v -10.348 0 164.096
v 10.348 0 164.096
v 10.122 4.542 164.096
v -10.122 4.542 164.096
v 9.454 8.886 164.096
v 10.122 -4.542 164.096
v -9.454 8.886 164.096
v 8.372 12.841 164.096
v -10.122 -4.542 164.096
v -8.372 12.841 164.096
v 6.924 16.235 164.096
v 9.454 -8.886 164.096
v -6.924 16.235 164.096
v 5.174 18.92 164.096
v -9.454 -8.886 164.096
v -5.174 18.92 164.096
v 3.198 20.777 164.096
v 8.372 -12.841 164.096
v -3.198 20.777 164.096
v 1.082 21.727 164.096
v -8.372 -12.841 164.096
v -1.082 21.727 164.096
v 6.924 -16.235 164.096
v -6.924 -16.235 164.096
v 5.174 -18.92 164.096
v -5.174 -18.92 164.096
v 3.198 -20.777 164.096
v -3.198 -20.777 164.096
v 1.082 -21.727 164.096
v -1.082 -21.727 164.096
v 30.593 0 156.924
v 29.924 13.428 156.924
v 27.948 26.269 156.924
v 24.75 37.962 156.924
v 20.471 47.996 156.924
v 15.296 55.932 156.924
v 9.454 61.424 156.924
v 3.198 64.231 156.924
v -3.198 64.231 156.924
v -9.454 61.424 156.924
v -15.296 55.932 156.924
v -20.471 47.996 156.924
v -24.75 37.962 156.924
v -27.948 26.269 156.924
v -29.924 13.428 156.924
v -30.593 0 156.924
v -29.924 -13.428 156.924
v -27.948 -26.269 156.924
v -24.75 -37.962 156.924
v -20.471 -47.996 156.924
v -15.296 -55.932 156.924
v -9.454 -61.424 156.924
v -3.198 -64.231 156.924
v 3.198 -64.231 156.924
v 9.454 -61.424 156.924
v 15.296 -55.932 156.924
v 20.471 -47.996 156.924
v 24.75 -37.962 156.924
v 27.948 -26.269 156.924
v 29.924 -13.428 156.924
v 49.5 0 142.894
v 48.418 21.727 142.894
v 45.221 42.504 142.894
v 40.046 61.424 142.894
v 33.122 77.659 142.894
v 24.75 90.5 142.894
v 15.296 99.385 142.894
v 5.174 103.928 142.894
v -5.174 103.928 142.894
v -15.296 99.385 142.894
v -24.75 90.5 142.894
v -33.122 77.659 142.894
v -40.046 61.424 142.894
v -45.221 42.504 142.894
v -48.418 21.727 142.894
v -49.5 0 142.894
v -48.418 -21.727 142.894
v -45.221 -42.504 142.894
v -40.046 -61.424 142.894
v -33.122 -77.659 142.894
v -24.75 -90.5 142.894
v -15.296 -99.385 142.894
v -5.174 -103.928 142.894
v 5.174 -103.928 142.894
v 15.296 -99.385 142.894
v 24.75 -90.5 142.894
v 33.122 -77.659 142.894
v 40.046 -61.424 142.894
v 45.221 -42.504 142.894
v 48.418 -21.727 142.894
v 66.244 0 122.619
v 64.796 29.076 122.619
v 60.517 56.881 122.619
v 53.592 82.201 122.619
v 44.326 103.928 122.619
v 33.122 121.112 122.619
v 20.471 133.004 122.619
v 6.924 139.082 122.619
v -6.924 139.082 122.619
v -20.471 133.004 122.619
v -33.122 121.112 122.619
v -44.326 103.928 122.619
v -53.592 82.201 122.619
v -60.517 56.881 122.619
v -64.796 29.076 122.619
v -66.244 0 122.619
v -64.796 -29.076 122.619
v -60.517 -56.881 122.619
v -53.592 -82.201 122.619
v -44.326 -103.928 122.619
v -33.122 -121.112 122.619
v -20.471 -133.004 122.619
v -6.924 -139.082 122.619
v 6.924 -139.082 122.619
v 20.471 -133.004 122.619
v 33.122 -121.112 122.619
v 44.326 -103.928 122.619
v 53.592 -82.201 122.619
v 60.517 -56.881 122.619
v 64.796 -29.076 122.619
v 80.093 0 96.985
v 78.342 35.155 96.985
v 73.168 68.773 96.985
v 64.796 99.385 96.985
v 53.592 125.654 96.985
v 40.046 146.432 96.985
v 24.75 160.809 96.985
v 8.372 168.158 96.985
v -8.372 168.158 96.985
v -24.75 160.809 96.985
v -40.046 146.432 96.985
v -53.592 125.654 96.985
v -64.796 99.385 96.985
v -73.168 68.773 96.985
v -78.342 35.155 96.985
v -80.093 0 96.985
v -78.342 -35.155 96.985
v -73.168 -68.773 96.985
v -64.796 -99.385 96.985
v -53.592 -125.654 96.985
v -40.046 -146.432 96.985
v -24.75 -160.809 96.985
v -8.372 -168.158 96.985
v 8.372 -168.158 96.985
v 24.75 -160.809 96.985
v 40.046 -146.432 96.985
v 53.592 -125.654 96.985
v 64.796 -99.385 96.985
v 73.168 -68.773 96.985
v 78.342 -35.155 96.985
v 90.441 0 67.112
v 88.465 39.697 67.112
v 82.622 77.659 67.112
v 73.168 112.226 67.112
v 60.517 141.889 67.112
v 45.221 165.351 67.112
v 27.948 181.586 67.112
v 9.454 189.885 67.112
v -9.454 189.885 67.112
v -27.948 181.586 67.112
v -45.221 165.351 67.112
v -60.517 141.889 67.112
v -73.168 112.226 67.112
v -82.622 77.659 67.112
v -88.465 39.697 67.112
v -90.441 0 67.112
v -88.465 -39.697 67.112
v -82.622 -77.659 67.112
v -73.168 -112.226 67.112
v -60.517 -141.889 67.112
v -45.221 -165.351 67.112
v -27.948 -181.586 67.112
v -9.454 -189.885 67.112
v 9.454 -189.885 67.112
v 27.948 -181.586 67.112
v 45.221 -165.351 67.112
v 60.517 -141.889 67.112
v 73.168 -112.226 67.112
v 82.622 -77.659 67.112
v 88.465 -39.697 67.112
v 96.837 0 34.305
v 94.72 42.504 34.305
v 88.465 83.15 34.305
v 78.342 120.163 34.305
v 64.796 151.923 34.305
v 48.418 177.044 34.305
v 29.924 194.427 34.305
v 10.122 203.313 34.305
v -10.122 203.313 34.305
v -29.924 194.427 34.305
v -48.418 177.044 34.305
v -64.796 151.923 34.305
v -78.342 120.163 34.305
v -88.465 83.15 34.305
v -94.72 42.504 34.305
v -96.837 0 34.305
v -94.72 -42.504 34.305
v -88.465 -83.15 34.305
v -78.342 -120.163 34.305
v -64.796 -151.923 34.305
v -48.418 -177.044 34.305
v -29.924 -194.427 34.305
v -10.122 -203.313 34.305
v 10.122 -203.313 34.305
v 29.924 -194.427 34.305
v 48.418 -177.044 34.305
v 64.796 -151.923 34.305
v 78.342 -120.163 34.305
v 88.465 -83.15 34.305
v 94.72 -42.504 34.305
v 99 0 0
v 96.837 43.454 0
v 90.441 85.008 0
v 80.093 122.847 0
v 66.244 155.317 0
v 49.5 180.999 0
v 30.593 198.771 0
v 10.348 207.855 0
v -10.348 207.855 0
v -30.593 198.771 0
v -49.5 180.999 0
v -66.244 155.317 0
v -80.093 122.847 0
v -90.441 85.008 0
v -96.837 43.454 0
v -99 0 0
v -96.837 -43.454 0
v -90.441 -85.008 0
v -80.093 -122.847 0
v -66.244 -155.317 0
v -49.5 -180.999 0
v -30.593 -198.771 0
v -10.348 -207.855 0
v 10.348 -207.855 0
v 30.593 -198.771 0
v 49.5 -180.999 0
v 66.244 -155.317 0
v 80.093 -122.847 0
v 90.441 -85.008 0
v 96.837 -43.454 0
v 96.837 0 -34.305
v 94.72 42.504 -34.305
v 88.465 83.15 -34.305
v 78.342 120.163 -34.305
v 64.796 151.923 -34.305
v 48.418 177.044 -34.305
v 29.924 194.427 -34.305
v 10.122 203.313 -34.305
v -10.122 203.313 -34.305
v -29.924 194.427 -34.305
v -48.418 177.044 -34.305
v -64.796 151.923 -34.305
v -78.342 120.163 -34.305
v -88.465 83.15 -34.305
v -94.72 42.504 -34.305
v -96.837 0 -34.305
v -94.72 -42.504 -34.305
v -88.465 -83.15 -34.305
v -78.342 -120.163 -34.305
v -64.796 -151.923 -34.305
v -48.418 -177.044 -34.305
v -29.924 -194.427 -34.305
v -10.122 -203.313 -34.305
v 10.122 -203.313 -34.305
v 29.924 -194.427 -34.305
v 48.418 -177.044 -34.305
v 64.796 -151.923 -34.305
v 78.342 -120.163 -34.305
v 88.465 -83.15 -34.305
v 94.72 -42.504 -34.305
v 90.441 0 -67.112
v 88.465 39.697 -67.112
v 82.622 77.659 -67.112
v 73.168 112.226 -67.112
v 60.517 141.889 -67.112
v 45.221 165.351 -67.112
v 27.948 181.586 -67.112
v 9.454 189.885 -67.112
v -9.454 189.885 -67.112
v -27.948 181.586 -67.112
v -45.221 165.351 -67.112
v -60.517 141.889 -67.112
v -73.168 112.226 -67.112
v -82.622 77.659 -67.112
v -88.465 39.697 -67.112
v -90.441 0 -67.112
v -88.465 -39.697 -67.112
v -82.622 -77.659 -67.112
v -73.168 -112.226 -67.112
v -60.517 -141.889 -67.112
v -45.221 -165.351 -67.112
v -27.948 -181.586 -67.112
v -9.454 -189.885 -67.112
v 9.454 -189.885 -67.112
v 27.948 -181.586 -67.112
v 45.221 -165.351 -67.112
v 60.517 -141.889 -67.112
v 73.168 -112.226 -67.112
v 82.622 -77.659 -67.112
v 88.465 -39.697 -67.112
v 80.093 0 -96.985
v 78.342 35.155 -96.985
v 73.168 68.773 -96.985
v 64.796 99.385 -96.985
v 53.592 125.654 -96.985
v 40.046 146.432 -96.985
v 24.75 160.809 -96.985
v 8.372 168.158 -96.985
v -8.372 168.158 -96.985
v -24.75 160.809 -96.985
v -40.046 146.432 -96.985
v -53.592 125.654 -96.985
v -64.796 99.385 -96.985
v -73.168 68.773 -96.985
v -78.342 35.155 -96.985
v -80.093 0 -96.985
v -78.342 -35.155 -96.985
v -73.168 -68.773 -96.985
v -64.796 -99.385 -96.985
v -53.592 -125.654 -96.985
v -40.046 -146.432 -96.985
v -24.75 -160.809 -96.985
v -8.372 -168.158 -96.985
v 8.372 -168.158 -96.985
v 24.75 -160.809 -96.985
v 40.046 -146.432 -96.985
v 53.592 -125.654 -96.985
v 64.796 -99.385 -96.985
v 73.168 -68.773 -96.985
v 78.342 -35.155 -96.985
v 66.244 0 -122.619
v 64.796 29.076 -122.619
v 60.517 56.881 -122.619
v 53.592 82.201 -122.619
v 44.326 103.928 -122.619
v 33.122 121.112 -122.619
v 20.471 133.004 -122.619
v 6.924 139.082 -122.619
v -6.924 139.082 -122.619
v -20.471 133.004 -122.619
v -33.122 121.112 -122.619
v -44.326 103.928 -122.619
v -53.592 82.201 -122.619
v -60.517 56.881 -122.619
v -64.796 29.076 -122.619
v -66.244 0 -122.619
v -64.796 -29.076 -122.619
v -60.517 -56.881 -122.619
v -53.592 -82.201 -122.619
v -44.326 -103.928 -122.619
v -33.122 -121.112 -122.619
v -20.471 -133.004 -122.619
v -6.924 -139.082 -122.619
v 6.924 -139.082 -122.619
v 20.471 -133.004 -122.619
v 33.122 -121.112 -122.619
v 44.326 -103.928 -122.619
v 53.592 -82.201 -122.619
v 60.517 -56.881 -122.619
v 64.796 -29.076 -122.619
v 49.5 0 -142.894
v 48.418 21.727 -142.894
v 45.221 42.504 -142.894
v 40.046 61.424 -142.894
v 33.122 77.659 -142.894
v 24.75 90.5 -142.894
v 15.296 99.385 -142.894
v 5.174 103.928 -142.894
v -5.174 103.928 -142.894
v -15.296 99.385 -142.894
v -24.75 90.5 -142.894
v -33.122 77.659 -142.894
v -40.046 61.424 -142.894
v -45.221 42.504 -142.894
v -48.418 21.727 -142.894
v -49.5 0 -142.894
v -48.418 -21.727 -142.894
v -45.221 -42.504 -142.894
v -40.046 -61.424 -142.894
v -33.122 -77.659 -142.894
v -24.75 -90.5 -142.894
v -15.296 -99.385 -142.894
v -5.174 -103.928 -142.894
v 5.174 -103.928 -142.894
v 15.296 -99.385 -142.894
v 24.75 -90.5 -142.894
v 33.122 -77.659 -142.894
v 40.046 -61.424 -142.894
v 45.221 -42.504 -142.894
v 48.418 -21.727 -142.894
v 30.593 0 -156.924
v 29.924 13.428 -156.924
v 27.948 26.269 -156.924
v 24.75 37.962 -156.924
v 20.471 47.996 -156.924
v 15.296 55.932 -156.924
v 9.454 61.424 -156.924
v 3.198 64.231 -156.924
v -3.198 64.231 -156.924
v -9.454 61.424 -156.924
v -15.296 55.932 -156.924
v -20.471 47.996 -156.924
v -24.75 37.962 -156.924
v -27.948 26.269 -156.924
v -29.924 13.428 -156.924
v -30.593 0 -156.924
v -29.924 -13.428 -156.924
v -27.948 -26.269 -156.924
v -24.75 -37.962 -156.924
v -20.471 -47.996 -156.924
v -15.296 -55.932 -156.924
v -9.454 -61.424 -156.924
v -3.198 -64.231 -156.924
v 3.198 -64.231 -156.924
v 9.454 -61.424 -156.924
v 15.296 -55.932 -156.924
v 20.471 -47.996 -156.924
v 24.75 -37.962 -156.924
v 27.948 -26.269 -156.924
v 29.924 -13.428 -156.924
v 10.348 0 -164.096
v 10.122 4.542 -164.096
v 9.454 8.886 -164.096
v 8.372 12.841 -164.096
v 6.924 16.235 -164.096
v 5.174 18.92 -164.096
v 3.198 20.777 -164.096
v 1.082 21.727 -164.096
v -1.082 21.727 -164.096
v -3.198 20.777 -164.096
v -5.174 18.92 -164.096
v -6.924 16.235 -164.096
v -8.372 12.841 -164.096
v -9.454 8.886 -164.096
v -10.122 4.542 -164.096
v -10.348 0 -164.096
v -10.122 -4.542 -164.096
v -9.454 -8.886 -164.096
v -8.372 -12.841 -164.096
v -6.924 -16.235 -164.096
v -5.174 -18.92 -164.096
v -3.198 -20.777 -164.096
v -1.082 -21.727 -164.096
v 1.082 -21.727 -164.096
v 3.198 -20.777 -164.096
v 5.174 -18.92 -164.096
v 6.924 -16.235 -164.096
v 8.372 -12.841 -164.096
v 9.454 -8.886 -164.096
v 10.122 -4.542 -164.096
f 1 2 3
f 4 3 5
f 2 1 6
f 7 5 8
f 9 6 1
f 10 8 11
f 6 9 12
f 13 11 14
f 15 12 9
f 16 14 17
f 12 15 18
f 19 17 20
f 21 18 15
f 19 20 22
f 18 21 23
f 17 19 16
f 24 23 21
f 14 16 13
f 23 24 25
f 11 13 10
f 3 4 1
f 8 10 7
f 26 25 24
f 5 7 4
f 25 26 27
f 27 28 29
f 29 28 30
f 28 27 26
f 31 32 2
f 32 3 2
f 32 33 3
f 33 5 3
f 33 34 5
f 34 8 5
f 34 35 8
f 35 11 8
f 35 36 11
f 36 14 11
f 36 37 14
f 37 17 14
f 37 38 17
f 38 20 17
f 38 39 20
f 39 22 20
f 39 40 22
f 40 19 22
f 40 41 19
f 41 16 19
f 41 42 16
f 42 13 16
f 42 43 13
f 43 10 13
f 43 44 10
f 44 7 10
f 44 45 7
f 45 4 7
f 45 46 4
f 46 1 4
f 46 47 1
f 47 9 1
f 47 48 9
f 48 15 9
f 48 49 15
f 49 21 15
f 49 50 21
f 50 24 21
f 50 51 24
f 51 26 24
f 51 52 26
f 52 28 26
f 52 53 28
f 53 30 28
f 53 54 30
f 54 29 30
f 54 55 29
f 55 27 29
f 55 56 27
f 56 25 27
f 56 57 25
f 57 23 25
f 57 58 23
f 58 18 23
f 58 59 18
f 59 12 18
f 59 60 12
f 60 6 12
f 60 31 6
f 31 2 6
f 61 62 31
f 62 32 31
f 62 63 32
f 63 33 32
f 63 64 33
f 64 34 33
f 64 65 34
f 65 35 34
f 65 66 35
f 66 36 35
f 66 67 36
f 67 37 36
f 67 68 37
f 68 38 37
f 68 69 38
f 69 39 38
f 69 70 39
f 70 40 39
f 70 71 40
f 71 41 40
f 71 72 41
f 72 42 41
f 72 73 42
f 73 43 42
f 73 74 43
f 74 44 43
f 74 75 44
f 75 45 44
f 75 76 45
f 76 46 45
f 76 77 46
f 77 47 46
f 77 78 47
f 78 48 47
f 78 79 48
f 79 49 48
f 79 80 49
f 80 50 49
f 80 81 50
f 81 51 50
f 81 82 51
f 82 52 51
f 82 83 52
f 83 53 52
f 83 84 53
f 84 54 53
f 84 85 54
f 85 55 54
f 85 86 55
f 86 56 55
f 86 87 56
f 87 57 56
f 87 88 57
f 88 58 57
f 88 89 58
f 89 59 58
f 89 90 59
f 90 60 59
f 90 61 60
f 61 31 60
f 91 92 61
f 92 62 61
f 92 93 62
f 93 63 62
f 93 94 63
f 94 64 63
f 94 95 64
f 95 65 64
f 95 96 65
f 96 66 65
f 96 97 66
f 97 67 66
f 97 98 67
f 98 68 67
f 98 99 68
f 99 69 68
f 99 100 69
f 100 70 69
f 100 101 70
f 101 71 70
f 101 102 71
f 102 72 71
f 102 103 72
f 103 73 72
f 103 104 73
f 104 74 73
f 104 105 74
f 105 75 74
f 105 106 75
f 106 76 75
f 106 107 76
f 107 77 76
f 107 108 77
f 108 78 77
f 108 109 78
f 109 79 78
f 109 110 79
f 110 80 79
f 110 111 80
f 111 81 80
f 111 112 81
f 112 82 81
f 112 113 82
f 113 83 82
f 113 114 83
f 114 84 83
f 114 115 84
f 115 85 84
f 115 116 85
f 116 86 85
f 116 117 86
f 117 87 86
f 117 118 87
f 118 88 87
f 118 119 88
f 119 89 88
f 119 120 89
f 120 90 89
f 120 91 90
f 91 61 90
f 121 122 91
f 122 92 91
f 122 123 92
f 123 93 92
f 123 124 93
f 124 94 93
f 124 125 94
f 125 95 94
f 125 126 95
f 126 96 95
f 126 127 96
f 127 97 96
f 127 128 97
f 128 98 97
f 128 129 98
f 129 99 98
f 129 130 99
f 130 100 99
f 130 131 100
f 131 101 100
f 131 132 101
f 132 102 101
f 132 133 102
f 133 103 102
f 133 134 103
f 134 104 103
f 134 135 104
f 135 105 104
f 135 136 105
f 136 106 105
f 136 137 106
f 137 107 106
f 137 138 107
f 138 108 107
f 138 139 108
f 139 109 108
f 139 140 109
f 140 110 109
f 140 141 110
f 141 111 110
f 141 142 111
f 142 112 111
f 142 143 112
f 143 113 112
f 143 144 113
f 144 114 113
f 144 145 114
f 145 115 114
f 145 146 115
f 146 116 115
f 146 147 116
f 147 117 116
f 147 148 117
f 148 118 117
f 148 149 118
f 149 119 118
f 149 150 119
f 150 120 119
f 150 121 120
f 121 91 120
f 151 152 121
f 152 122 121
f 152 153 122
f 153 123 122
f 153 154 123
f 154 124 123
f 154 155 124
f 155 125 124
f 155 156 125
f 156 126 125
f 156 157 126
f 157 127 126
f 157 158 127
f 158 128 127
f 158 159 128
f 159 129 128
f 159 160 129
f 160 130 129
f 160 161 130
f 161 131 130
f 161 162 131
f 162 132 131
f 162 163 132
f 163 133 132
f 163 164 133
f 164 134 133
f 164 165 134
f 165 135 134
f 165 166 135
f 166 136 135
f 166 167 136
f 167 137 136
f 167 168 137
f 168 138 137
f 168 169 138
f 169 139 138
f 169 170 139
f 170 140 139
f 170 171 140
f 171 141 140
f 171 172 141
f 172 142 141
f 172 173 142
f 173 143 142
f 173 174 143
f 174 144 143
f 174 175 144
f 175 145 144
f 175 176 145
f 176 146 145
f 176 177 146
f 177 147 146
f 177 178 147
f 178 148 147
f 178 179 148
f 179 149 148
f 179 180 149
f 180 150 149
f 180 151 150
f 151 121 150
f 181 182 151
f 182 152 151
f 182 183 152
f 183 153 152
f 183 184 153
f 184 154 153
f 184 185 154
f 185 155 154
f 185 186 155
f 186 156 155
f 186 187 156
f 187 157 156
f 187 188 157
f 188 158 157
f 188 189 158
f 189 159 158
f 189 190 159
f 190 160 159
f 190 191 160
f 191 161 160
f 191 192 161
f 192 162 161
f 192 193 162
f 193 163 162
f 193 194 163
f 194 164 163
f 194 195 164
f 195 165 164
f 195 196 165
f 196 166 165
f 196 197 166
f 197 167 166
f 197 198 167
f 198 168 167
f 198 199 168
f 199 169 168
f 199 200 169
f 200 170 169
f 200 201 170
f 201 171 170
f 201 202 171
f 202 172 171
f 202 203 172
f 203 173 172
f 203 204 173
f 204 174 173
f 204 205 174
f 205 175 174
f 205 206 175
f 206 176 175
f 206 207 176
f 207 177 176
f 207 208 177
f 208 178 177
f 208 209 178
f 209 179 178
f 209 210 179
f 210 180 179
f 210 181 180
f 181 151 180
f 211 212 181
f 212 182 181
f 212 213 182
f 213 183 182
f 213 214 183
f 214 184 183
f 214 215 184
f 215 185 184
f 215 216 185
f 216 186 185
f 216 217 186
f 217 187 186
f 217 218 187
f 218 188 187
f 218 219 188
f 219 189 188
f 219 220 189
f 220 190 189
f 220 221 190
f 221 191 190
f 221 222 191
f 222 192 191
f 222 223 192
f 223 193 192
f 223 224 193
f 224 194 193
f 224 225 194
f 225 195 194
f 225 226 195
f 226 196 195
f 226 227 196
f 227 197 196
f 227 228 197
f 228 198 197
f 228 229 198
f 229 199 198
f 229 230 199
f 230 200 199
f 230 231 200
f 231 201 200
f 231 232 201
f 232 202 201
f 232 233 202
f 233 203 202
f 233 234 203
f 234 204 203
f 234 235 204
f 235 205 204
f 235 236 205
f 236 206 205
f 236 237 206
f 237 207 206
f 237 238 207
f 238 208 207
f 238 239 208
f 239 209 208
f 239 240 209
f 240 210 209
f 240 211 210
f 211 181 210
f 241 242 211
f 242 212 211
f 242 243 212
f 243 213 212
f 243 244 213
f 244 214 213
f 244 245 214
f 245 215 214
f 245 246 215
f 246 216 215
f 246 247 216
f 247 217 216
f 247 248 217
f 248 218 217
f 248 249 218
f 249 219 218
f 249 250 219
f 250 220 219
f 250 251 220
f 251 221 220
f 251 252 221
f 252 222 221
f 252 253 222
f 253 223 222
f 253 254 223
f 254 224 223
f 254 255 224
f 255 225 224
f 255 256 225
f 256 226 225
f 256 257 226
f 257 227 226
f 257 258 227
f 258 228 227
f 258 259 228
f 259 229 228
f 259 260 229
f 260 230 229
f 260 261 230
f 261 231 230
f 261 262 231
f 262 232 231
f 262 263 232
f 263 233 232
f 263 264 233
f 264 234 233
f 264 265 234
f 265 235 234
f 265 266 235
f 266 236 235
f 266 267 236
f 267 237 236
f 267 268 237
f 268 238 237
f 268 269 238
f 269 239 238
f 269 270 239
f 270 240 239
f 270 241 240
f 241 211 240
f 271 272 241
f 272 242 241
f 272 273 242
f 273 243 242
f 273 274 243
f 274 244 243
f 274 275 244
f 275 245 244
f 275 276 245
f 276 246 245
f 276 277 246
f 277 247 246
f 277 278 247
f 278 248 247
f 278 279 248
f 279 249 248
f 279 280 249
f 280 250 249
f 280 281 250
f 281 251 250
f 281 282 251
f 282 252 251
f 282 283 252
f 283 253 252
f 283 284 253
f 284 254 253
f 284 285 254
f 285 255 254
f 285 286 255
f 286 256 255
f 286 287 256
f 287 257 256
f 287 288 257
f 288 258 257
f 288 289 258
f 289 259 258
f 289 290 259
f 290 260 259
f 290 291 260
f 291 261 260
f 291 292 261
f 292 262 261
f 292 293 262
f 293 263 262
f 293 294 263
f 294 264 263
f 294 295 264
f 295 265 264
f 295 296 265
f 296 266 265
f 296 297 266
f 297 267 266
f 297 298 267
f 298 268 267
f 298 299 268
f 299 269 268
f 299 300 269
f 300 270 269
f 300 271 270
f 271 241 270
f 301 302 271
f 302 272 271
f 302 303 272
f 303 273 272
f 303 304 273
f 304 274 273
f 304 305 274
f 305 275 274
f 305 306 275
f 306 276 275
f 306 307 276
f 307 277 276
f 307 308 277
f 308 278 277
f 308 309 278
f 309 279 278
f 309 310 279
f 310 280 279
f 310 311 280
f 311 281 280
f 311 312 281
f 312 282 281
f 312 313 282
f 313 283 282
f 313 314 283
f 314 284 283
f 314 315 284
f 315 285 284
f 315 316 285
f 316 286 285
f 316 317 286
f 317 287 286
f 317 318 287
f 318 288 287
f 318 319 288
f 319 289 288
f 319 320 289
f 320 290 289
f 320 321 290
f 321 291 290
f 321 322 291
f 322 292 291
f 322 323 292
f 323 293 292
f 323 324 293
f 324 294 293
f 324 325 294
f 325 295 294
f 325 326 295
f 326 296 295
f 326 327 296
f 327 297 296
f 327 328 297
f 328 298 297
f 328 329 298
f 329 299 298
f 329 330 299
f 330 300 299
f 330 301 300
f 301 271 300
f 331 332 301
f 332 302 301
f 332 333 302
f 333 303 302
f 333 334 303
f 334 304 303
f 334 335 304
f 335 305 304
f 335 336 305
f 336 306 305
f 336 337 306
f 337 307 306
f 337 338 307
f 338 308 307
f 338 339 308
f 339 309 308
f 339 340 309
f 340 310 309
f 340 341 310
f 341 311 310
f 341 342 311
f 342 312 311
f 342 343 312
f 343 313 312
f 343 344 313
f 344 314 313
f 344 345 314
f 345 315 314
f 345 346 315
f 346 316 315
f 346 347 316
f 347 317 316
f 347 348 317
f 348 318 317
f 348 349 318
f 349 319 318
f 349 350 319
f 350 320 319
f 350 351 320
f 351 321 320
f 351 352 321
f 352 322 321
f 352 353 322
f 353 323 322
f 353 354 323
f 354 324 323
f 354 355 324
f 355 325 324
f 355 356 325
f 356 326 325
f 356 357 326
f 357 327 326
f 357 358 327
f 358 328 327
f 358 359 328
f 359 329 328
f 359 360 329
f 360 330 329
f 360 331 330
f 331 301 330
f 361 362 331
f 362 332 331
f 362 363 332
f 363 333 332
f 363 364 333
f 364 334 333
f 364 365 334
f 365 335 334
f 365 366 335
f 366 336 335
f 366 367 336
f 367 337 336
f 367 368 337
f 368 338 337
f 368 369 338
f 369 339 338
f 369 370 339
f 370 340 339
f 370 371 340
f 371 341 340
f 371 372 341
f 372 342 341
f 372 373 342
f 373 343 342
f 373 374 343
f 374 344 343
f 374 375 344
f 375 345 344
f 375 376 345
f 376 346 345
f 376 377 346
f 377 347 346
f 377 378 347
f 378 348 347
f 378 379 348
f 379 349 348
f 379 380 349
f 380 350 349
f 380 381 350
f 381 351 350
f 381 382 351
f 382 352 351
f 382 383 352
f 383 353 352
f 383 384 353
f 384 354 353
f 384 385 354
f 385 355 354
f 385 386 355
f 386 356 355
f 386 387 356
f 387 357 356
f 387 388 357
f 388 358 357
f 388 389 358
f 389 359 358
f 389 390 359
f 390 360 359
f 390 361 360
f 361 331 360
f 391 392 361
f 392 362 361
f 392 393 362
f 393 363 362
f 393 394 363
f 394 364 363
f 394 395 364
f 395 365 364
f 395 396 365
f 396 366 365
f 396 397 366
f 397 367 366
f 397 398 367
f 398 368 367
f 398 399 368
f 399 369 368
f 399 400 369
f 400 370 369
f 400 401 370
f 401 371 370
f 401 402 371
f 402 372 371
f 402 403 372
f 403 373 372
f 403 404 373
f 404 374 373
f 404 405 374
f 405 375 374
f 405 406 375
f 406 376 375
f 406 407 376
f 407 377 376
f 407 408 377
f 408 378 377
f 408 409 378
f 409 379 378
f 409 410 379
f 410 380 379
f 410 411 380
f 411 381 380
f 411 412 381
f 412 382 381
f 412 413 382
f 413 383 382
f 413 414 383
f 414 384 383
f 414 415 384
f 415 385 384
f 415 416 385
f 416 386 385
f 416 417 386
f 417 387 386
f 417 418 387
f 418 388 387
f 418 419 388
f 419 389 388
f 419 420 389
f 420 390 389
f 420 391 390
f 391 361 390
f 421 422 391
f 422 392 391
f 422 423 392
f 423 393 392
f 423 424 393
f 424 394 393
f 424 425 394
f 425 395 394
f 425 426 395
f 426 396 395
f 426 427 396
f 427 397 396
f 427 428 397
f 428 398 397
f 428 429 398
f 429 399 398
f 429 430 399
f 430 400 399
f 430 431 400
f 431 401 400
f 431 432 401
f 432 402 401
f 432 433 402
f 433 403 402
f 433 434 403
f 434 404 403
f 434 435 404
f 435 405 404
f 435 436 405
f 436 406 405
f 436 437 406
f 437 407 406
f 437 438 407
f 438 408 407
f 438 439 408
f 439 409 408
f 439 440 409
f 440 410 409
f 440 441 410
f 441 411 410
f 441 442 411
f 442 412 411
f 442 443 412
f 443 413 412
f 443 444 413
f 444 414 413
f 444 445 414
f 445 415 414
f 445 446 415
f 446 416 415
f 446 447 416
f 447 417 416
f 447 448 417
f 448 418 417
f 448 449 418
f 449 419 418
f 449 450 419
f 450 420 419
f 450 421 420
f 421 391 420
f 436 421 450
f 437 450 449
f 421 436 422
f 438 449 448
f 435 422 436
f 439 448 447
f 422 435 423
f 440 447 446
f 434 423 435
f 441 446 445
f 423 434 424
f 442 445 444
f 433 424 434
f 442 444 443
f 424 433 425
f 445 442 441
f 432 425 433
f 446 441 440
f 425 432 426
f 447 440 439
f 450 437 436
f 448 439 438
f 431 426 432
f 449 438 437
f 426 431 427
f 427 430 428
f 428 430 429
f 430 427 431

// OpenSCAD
// Generated by SolidPython 1.0.1 on 2020-07-29 00:46:49


scale(v = [9, 19, 15]) {
	sphere(r = 11);
}
/***********************************************
*********      SolidPython code:      **********
************************************************
 
# import packages: SolidPython
from solid import *
from solid.utils import *
from itertools import chain, combinations, permutations


class Resize:

    def __init__(self, scad_file):
        self.scad_file = scad_file
        #self.scad_file = import_scad(scad_file)
        # cone/cylinder param:
        self.r1 = 0
        self.r2 = 0
        self.h = 0
        # rectangular prism param:
        self.w = 0
        self.l = 0
        # ellipse param:
        self.r = 0

    # import OpenScad code (file name corresponds to shape)


    # classify shape + parameters
    def assign(self, param1, param2, param3):
        if self.scad_file == 'cone.scad':
            self.r1 = param1
            self.r2 = param2
            self.h = param3
        elif self.scad_file == 'cylinder.scad':
            self.r1 = param1
            self.r2 = param2
            self.h = param3
        elif self.scad_file == 'rectangularPrism.scad':
            self.h = param1
            self.l = param2
            self.w = param3
        else:
            self.r = param1
            self.h = param2

    # resize parameters
    def iterate(self):
        x = range(3, 20, 2)
        i = 1
        if self.scad_file == 'cone.scad':
            tempList = list(permutations(x, 2))
            for temp in tempList:
                param1 = temp[0]
                param2 = temp[1]
                filepath = 'produced_scad_files/' + 'cone' + str(param1) + '_' + str(param2) + '_' + '.scad'
                scad_render_to_file(cylinder(h=param1, r1=param2, r2=0), filepath)

        elif self.scad_file == 'cylinder.scad':
            tempList = list(permutations(x, 3))
            for temp in tempList:
                param1 = temp[0]
                param2 = temp[1]
                filepath = 'produced_scad_files/' + 'cylinder' + str(param1) + '_' + str(param2) + '_' + '.scad'
                scad_render_to_file(cylinder(h=param1, r1=param2, r2=param2), filepath)

        elif self.scad_file == 'rectangularPrism.scad':
            tempList = list(permutations(x, 3))
            for temp in tempList:
                param1 = temp[0]
                param2 = temp[1]
                param3 = temp[2]
                filepath = 'produced_scad_files/' + 'rectangularPrism' + str(param1) + '_' + str(param2) + '_' + str(
                    param3) + '.scad'
                scad_render_to_file(cube(size=(param1, param2, param3)), filepath)

        elif self.scad_file == 'ellipse.scad':
            tempList = list(permutations(x, 4))
            for temp in tempList:
                param1 = temp[0]
                param2 = temp[1]
                param3 = temp[2]
                param4 = temp[3]
                filepath = 'produced_scad_files/' + 'ellipse' + str(param1) + '_' + str(param2) + '_' + str(param3) + '_' + str(param4) + '.scad'
                scad_render_to_file(scale([param1, param2, param3])(sphere(r=param4)), filepath)

    def render_to_scadfile(self):
        scad_render_to_file(scad, 'example.scad') 
 
************************************************/
